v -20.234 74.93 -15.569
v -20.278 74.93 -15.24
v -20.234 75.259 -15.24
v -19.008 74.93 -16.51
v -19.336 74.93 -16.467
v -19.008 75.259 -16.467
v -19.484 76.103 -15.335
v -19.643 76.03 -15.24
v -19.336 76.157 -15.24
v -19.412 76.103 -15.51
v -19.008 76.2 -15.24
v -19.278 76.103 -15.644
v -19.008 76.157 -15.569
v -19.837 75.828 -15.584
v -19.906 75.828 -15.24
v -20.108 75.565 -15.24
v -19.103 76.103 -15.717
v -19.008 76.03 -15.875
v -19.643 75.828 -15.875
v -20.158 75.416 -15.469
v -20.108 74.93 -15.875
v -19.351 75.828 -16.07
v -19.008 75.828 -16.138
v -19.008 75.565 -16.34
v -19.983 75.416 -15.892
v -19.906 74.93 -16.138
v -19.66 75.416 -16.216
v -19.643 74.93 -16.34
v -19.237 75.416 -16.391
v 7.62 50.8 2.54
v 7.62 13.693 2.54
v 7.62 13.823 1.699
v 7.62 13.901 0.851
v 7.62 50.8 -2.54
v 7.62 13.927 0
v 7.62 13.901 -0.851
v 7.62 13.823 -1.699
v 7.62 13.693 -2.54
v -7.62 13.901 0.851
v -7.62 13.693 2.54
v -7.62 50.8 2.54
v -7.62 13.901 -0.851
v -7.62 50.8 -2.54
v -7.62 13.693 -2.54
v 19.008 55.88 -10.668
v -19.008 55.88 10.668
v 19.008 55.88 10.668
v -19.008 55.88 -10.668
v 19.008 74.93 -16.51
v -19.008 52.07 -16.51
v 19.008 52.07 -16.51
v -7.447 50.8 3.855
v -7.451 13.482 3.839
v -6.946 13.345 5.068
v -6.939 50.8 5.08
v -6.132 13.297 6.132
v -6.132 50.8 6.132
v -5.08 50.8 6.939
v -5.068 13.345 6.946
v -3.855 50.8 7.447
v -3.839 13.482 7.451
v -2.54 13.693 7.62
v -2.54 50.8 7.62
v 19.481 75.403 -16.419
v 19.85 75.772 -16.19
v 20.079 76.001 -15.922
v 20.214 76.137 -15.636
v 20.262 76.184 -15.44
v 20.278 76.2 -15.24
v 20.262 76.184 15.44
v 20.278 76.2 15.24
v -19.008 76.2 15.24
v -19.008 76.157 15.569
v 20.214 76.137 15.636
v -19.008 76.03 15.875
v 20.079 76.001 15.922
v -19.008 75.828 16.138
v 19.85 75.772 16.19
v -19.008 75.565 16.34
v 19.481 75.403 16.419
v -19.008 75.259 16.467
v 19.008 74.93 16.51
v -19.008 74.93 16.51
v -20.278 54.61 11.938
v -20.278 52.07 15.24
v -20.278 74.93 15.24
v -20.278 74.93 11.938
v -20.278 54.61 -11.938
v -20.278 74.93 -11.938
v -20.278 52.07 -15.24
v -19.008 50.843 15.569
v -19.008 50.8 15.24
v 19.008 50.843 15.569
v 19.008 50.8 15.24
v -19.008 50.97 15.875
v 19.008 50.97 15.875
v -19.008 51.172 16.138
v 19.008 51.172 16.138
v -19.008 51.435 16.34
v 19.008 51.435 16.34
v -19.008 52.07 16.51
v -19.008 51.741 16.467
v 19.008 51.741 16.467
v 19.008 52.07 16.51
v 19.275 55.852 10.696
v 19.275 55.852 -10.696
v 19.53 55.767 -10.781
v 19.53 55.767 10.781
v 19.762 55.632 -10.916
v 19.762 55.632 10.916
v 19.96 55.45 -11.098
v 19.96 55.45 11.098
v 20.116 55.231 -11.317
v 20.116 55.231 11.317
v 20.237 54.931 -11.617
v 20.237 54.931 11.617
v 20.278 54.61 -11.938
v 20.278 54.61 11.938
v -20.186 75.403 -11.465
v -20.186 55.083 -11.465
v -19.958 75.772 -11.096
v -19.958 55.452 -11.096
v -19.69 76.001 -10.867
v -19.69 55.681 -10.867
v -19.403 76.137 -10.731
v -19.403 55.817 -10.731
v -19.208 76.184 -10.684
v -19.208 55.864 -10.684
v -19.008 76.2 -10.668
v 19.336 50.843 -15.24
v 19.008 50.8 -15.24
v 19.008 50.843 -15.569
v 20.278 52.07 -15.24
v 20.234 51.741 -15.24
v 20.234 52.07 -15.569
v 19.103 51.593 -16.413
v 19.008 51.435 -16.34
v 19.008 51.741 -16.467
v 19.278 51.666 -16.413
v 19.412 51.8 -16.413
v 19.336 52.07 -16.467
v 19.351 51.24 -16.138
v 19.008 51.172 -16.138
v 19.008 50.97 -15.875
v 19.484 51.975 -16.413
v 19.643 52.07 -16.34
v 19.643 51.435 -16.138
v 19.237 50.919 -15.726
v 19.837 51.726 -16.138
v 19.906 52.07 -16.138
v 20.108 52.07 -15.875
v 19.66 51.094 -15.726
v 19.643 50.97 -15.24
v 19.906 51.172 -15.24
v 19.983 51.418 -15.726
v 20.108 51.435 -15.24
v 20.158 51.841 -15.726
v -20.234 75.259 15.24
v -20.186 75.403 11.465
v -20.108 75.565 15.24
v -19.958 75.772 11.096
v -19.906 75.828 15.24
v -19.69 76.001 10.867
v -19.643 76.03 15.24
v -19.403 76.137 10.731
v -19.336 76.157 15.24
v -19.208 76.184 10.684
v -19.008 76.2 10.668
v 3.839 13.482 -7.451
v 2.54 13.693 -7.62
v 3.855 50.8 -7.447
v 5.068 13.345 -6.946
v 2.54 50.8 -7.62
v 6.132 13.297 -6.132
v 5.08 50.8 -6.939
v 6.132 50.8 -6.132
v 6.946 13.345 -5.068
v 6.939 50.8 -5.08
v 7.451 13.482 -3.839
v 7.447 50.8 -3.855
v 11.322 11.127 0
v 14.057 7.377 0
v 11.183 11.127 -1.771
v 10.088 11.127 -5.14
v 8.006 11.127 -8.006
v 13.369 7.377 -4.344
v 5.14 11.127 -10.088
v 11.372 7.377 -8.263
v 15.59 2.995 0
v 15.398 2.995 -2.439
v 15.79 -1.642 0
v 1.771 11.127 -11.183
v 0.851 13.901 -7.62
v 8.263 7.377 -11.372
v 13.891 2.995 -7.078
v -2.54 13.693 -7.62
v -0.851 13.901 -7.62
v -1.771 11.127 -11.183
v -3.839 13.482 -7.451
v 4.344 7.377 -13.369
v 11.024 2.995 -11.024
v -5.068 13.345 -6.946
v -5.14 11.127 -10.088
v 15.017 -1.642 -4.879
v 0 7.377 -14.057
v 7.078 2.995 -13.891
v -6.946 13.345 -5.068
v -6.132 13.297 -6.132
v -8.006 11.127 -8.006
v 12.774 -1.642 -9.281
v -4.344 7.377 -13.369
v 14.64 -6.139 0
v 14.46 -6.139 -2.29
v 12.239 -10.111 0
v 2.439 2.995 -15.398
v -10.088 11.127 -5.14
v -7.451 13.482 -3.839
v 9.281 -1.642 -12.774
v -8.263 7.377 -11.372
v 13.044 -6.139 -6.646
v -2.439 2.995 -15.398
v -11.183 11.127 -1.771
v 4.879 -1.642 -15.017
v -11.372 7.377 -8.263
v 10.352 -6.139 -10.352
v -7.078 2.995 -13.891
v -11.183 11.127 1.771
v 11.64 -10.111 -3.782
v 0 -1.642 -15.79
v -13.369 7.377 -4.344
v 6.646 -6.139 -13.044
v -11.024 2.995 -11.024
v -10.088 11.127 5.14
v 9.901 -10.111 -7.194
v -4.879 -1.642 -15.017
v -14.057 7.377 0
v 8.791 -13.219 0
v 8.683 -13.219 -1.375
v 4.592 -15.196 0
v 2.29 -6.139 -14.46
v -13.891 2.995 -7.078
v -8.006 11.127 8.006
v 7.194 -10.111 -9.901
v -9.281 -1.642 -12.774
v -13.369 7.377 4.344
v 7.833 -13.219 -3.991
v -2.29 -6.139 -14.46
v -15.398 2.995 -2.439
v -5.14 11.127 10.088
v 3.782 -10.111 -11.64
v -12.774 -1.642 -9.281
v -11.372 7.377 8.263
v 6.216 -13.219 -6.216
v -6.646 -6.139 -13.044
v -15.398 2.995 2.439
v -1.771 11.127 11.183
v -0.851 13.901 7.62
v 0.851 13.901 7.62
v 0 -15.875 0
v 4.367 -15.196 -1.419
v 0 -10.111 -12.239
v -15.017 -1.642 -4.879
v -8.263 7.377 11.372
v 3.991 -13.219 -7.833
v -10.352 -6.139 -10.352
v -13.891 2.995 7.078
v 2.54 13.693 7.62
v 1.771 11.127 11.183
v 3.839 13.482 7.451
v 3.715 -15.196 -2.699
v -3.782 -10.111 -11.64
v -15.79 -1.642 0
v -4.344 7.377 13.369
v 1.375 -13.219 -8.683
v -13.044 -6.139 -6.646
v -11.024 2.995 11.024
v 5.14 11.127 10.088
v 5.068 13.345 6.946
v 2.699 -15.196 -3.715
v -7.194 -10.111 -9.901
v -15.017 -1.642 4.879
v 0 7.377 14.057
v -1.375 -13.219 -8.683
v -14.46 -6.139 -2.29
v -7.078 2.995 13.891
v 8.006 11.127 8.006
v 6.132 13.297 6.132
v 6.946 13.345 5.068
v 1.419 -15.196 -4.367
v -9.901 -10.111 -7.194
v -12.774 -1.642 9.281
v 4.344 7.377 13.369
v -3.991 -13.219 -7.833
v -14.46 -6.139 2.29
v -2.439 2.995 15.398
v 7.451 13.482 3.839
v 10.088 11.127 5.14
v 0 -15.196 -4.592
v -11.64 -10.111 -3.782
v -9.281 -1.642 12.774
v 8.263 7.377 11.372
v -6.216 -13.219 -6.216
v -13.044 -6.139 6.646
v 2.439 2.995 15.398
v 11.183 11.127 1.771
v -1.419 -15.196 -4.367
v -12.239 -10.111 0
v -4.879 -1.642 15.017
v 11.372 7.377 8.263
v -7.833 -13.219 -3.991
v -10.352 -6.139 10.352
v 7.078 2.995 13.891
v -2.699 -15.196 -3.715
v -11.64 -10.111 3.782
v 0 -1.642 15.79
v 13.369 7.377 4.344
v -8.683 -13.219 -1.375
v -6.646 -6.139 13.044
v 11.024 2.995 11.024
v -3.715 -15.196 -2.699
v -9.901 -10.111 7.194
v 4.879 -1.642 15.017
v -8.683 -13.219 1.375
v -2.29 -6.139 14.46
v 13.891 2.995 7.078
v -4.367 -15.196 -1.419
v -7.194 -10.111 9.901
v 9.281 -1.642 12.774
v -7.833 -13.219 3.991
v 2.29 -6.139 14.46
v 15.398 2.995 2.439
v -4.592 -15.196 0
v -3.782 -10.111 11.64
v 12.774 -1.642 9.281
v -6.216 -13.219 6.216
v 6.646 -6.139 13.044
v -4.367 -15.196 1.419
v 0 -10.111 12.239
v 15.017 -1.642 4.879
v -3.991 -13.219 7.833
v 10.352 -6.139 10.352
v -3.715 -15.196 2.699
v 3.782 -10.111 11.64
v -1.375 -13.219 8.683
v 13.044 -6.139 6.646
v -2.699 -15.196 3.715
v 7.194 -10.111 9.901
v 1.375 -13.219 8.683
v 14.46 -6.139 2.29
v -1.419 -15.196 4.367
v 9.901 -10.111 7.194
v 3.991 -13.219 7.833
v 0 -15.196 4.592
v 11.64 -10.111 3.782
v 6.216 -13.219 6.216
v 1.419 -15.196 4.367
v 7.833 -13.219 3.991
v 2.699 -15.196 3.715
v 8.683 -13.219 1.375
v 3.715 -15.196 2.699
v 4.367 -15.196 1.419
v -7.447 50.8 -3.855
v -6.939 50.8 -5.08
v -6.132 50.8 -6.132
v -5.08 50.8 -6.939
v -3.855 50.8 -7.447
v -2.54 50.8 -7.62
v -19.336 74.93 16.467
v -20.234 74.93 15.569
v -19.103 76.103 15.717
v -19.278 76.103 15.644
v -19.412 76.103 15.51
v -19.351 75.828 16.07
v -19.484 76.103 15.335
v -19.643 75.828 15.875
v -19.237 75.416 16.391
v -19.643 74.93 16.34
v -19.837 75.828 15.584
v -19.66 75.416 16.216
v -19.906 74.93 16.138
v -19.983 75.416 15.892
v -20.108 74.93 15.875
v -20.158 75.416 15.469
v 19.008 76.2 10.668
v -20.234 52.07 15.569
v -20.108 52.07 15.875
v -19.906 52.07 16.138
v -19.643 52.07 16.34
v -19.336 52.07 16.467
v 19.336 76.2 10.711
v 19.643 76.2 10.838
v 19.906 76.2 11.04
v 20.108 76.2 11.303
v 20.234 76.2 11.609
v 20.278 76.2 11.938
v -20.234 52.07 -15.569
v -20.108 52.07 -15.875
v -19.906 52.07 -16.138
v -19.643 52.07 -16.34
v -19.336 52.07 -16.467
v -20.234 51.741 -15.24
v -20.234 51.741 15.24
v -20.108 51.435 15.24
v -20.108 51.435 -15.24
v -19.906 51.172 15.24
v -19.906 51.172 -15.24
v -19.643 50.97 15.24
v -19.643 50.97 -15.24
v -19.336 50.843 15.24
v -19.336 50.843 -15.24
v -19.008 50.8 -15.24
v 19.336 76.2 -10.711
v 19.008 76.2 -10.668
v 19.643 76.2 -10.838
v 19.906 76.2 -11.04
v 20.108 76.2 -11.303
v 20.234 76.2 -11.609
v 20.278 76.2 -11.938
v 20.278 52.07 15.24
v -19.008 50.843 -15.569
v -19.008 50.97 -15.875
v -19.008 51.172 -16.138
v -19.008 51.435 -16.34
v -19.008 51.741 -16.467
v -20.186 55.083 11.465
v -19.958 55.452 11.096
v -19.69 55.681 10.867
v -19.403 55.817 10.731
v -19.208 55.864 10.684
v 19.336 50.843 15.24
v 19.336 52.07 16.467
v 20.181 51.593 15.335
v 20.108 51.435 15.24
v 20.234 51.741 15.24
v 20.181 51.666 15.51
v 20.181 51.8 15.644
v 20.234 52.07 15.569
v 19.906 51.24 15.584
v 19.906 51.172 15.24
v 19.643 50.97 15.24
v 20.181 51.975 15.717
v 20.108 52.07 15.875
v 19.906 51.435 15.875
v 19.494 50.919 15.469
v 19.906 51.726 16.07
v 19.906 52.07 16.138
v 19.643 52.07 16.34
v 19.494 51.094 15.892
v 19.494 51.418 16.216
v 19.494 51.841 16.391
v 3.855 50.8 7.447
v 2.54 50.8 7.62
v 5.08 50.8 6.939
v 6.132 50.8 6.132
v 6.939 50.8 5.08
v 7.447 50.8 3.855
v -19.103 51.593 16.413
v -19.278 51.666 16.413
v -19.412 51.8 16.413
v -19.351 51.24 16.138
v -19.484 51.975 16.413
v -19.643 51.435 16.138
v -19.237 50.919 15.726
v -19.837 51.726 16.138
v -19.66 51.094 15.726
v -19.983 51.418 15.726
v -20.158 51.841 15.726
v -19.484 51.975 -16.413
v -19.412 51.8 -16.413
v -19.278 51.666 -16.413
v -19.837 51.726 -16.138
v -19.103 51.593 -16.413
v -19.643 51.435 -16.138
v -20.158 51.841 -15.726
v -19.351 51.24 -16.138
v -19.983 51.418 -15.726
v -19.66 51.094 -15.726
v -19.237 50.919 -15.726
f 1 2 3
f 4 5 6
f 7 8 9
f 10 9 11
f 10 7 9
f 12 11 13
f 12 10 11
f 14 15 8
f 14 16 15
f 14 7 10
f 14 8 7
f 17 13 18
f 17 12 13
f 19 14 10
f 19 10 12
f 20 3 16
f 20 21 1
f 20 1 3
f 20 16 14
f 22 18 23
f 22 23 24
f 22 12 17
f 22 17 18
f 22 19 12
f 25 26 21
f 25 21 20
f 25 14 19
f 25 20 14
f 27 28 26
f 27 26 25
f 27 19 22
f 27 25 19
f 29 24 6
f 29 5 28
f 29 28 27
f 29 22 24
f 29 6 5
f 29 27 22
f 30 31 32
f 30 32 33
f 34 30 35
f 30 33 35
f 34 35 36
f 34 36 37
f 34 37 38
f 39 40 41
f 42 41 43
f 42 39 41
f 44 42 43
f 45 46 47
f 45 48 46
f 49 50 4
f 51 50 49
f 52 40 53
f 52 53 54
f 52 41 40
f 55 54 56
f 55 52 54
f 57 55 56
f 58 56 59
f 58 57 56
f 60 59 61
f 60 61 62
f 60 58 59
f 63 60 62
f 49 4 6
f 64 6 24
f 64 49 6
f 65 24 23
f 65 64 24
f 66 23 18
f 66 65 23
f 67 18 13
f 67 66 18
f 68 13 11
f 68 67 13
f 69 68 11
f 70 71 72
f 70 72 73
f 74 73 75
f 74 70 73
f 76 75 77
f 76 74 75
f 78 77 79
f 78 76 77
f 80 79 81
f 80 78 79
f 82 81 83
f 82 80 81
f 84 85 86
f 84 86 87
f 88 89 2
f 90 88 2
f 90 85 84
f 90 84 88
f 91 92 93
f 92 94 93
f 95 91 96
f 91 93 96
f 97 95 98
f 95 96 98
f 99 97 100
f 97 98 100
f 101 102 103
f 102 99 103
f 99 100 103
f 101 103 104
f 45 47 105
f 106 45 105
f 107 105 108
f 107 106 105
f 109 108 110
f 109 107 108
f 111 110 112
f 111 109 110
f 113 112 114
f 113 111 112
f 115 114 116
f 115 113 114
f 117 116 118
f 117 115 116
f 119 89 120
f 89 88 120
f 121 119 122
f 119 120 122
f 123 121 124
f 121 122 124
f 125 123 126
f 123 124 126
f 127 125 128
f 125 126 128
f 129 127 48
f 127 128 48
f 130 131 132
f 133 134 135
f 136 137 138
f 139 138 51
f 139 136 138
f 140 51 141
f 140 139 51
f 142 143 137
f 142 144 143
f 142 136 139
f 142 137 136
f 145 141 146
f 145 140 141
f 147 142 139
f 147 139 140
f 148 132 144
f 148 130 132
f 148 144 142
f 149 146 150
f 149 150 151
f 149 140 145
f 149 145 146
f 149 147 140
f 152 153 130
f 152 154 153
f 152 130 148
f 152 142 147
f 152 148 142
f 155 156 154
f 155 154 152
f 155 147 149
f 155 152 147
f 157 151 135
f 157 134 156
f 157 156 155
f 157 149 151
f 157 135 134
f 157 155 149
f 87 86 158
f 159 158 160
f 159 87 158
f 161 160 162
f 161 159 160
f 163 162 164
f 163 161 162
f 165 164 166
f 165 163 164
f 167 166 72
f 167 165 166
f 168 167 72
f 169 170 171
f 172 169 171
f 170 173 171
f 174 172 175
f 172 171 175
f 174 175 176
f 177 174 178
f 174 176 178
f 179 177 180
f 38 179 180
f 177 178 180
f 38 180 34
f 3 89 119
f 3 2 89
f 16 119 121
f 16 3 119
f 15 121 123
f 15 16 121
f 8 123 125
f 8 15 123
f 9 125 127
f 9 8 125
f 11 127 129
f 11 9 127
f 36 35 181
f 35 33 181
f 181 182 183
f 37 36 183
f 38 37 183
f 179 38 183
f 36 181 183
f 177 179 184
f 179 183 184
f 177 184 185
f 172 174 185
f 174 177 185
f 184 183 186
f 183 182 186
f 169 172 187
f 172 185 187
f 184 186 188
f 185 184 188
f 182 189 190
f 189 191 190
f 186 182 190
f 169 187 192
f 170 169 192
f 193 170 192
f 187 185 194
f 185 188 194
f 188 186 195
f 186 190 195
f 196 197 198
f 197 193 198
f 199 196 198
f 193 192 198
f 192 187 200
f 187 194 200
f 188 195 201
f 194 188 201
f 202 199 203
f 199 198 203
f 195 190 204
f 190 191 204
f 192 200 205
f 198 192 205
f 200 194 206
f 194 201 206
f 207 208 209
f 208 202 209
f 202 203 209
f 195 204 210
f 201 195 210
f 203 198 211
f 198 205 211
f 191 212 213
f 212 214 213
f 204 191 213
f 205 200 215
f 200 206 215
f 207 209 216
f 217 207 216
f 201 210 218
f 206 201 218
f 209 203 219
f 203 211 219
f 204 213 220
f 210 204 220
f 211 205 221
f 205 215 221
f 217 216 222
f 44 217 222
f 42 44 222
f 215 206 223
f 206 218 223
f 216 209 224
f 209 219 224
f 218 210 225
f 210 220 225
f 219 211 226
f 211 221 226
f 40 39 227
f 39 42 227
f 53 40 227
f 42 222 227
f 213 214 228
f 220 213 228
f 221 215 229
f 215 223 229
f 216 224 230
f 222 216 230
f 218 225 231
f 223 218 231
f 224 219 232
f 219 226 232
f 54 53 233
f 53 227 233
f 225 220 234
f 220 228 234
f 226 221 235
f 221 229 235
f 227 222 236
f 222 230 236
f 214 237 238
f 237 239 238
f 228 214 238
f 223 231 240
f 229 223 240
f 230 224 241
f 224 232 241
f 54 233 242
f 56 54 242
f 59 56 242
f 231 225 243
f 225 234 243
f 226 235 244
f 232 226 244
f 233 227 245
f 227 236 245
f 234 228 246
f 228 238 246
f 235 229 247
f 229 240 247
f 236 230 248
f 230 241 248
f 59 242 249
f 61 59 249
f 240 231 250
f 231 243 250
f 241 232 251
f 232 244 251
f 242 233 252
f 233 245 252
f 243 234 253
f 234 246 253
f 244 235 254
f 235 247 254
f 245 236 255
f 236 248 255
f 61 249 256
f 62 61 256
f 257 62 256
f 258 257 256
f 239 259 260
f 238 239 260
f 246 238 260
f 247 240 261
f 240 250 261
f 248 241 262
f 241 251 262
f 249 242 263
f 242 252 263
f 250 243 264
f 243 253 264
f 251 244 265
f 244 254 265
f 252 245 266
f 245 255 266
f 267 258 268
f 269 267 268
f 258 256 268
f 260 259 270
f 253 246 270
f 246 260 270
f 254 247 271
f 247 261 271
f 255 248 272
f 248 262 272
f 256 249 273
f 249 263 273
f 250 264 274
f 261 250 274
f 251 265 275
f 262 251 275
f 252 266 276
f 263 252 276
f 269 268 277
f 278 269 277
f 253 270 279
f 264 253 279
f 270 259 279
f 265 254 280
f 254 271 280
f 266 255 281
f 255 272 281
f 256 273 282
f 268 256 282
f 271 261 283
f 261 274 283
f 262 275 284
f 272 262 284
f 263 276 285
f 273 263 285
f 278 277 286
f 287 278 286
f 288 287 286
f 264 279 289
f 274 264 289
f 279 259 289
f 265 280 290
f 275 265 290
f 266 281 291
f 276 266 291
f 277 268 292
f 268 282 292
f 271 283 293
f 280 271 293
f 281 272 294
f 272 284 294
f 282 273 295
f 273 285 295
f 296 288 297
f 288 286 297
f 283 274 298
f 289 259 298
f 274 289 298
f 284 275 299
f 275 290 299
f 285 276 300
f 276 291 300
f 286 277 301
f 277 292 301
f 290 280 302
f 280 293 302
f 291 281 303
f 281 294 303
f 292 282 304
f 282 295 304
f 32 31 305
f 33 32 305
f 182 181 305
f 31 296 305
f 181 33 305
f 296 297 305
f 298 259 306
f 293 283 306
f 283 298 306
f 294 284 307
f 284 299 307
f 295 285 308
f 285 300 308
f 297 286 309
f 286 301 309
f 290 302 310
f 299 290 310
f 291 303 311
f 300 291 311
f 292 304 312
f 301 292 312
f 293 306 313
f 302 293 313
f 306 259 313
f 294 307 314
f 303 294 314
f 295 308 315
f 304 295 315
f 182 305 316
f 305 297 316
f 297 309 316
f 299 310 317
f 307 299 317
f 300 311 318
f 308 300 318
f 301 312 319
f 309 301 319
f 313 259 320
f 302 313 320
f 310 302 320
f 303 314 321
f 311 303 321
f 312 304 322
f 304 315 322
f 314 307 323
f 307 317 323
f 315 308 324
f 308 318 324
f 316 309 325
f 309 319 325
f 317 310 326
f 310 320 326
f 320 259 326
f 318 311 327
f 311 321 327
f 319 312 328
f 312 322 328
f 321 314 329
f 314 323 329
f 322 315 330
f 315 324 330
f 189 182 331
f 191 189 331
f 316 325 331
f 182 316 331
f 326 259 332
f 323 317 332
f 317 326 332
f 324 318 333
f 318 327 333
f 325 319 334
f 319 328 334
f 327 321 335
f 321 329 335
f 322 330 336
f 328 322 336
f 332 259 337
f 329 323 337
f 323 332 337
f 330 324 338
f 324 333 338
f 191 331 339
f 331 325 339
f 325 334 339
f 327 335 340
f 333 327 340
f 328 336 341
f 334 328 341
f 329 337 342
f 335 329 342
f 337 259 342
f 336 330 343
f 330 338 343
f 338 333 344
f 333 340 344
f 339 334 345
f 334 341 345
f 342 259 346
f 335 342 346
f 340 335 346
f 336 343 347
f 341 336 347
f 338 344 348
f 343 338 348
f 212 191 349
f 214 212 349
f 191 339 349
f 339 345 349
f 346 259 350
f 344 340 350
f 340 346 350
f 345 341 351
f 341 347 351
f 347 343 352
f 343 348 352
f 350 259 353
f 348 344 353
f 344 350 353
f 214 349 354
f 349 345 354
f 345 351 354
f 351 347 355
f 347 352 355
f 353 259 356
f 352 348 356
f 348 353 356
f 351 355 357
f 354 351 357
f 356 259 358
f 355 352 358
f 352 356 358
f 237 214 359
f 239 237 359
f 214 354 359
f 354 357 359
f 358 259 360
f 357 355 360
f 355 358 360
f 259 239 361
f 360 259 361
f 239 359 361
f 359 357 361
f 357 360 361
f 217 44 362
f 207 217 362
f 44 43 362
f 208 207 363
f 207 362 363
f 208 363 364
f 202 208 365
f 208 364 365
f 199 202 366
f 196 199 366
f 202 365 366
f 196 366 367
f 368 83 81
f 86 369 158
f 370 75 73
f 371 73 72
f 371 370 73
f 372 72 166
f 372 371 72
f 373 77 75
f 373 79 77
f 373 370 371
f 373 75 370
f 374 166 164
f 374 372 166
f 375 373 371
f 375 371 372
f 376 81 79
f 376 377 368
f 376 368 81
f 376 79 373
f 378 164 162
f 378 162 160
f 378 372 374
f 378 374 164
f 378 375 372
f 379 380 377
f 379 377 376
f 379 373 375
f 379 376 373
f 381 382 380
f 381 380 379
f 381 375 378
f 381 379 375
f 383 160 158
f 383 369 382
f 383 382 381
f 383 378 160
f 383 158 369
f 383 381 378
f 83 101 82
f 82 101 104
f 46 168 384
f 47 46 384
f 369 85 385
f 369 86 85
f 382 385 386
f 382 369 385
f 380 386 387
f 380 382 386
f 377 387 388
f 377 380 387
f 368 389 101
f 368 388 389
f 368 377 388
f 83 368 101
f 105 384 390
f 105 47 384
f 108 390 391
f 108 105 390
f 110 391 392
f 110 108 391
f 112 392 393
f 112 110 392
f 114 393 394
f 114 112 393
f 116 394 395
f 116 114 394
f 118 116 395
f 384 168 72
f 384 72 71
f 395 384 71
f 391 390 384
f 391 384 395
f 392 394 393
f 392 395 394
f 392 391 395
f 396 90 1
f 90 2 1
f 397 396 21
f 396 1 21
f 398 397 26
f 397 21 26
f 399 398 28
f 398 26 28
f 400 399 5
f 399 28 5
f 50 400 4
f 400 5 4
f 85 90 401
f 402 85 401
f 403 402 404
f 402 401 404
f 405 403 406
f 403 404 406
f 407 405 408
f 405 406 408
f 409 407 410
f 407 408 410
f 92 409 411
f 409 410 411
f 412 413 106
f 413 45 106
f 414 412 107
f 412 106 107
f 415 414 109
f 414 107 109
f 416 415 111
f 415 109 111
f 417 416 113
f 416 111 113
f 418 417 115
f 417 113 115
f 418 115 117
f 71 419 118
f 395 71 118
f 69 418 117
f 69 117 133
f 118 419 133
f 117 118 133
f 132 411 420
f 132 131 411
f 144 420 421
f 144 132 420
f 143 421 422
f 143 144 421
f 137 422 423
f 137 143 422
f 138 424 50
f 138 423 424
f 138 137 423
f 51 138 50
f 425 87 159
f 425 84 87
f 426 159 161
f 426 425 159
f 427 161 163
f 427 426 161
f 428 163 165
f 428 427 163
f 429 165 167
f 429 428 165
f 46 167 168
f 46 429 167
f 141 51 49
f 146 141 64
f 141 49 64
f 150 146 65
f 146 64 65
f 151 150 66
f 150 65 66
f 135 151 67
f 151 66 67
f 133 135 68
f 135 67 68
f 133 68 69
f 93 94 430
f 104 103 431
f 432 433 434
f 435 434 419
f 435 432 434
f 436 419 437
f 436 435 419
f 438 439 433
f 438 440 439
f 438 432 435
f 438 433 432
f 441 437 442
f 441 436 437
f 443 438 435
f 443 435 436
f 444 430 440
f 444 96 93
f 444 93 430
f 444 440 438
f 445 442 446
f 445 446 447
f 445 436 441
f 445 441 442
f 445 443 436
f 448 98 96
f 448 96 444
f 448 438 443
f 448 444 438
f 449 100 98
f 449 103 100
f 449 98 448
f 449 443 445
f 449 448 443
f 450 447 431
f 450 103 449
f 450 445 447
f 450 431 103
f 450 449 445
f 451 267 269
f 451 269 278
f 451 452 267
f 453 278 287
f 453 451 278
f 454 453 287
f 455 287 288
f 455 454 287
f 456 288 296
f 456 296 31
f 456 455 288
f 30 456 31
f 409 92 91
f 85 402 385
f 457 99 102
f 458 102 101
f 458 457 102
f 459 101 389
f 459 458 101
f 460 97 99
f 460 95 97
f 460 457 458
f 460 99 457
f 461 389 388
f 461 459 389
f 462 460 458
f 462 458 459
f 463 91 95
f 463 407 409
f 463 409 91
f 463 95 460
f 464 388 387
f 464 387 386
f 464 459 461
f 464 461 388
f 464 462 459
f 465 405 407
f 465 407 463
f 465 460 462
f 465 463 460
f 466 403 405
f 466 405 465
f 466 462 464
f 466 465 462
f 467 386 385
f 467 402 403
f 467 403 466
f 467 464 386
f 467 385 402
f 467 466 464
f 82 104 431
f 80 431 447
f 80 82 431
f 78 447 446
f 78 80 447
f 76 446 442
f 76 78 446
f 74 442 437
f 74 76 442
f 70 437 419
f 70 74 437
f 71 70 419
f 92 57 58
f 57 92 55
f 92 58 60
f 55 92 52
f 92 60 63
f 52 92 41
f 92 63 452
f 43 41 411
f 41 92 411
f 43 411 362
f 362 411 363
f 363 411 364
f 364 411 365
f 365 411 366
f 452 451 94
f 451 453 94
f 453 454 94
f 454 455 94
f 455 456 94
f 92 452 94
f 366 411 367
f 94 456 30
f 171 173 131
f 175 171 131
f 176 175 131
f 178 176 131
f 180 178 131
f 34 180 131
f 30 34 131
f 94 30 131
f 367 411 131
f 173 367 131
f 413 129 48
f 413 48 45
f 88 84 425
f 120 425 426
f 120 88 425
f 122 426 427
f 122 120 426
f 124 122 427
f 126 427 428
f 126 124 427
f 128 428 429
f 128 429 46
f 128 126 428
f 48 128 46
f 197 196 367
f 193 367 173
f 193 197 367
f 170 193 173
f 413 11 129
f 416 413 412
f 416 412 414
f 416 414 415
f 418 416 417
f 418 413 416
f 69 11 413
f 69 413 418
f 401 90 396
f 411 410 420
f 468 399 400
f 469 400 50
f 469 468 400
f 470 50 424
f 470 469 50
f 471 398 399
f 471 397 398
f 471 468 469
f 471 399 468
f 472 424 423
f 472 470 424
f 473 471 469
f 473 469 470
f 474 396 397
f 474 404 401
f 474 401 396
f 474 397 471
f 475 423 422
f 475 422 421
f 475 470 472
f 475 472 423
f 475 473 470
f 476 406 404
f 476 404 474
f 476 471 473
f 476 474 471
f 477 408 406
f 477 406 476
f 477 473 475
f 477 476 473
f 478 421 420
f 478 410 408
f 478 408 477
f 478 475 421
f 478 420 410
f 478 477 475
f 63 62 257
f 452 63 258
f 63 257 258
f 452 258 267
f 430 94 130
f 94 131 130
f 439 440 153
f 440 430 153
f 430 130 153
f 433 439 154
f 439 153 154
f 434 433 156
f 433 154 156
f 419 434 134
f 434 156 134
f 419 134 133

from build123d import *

# Parameters (mm, degrees)
SKETCH2_W           = 15.24
SKETCH2_H           = 15.24
BOSS_EXTRUDE1_DEPTH = 50.8
FILLET1_R           = 5.08
SKETCH4_W           = 40.555388052
SKETCH4_H           = 33.02
BOSS_EXTRUDE3_DEPTH = 25.4
SKETCH5_W           = 40.555388052
SKETCH5_H           = 21.336
CUT_EXTRUDE1_DEPTH  = 20.32
FILLET2_R           = 1.27
SKETCH3_R           = 11.43
BOSS_EXTRUDE2_DEPTH = 2.54


with BuildPart() as part:
    # Sketch1 → Revolve1 (revolve)
    with BuildSketch(Plane.XY):
        with BuildLine():
            Line((0, -15.875), (0, 15.875))
            ThreePointArc((0, 15.875), (15.875, 0), (0, -15.875))
        make_face()
    revolve(axis=Axis((0, -15.875, 0), (0, 1, 0)))

    # Sketch2 → Boss-Extrude1 (add)
    with BuildSketch(Plane(origin=(0, 0, 0), x_dir=(1, 0, 0), z_dir=(0, 1, 0))):
        Rectangle(SKETCH2_W, SKETCH2_H)
    extrude(amount=BOSS_EXTRUDE1_DEPTH)

    # Fillet1
    fillet1_edges = [part.edges().sort_by_distance(p)[0] for p in [
        (-7.62, 31.228525221, -7.62),
        (-7.62, 31.228525221, 7.62),
        (7.62, 31.228525221, 7.62),
        (7.62, 31.228525221, -7.62),
    ]]
    fillet(fillet1_edges, radius=FILLET1_R)

    # Sketch4 → Boss-Extrude3 (add)
    with BuildSketch(Plane(origin=(0, 50.8, 0), x_dir=(1, 0, 0), z_dir=(0, 1, 0))):
        Rectangle(SKETCH4_W, SKETCH4_H)
    extrude(amount=BOSS_EXTRUDE3_DEPTH)

    # Sketch5 → Cut-Extrude1 (cut)
    with BuildSketch(Plane(origin=(0, 76.2, 0), x_dir=(1, 0, 0), z_dir=(0, 1, 0))):
        Rectangle(SKETCH5_W, SKETCH5_H)
    extrude(amount=-CUT_EXTRUDE1_DEPTH, mode=Mode.SUBTRACT)

    # Fillet2
    fillet2_edges = [part.edges().sort_by_distance(p)[0] for p in [
        (-20.277694026, 50.8, 0),
        (-20.277694026, 63.5, -16.51),
        (0, 50.8, 16.51),
        (-20.277694026, 63.5, 16.51),
        (20.277694026, 50.8, 0),
        (20.277694026, 63.5, 16.51),
        (0, 50.8, -16.51),
        (20.277694026, 63.5, -16.51),
        (-20.277694026, 76.2, -13.589),
        (0, 76.2, 16.51),
        (0, 76.2, -16.51),
        (-20.277694026, 76.2, 13.589),
        (-20.277694026, 55.88, 0),
        (-20.277694026, 66.04, 10.668),
        (-20.277694026, 66.04, -10.668),
        (20.277694026, 55.88, 0),
        (20.277694026, 66.04, -10.668),
        (20.277694026, 66.04, 10.668),
    ]]
    fillet(fillet2_edges, radius=FILLET2_R)

    # Sketch3 → Boss-Extrude2 (add)
    with BuildSketch(Plane(origin=(0, 50.8, 0), x_dir=(1, 0, 0), z_dir=(0, 1, 0))):
        Circle(SKETCH3_R)
    extrude(amount=BOSS_EXTRUDE2_DEPTH)


solid = part.part
